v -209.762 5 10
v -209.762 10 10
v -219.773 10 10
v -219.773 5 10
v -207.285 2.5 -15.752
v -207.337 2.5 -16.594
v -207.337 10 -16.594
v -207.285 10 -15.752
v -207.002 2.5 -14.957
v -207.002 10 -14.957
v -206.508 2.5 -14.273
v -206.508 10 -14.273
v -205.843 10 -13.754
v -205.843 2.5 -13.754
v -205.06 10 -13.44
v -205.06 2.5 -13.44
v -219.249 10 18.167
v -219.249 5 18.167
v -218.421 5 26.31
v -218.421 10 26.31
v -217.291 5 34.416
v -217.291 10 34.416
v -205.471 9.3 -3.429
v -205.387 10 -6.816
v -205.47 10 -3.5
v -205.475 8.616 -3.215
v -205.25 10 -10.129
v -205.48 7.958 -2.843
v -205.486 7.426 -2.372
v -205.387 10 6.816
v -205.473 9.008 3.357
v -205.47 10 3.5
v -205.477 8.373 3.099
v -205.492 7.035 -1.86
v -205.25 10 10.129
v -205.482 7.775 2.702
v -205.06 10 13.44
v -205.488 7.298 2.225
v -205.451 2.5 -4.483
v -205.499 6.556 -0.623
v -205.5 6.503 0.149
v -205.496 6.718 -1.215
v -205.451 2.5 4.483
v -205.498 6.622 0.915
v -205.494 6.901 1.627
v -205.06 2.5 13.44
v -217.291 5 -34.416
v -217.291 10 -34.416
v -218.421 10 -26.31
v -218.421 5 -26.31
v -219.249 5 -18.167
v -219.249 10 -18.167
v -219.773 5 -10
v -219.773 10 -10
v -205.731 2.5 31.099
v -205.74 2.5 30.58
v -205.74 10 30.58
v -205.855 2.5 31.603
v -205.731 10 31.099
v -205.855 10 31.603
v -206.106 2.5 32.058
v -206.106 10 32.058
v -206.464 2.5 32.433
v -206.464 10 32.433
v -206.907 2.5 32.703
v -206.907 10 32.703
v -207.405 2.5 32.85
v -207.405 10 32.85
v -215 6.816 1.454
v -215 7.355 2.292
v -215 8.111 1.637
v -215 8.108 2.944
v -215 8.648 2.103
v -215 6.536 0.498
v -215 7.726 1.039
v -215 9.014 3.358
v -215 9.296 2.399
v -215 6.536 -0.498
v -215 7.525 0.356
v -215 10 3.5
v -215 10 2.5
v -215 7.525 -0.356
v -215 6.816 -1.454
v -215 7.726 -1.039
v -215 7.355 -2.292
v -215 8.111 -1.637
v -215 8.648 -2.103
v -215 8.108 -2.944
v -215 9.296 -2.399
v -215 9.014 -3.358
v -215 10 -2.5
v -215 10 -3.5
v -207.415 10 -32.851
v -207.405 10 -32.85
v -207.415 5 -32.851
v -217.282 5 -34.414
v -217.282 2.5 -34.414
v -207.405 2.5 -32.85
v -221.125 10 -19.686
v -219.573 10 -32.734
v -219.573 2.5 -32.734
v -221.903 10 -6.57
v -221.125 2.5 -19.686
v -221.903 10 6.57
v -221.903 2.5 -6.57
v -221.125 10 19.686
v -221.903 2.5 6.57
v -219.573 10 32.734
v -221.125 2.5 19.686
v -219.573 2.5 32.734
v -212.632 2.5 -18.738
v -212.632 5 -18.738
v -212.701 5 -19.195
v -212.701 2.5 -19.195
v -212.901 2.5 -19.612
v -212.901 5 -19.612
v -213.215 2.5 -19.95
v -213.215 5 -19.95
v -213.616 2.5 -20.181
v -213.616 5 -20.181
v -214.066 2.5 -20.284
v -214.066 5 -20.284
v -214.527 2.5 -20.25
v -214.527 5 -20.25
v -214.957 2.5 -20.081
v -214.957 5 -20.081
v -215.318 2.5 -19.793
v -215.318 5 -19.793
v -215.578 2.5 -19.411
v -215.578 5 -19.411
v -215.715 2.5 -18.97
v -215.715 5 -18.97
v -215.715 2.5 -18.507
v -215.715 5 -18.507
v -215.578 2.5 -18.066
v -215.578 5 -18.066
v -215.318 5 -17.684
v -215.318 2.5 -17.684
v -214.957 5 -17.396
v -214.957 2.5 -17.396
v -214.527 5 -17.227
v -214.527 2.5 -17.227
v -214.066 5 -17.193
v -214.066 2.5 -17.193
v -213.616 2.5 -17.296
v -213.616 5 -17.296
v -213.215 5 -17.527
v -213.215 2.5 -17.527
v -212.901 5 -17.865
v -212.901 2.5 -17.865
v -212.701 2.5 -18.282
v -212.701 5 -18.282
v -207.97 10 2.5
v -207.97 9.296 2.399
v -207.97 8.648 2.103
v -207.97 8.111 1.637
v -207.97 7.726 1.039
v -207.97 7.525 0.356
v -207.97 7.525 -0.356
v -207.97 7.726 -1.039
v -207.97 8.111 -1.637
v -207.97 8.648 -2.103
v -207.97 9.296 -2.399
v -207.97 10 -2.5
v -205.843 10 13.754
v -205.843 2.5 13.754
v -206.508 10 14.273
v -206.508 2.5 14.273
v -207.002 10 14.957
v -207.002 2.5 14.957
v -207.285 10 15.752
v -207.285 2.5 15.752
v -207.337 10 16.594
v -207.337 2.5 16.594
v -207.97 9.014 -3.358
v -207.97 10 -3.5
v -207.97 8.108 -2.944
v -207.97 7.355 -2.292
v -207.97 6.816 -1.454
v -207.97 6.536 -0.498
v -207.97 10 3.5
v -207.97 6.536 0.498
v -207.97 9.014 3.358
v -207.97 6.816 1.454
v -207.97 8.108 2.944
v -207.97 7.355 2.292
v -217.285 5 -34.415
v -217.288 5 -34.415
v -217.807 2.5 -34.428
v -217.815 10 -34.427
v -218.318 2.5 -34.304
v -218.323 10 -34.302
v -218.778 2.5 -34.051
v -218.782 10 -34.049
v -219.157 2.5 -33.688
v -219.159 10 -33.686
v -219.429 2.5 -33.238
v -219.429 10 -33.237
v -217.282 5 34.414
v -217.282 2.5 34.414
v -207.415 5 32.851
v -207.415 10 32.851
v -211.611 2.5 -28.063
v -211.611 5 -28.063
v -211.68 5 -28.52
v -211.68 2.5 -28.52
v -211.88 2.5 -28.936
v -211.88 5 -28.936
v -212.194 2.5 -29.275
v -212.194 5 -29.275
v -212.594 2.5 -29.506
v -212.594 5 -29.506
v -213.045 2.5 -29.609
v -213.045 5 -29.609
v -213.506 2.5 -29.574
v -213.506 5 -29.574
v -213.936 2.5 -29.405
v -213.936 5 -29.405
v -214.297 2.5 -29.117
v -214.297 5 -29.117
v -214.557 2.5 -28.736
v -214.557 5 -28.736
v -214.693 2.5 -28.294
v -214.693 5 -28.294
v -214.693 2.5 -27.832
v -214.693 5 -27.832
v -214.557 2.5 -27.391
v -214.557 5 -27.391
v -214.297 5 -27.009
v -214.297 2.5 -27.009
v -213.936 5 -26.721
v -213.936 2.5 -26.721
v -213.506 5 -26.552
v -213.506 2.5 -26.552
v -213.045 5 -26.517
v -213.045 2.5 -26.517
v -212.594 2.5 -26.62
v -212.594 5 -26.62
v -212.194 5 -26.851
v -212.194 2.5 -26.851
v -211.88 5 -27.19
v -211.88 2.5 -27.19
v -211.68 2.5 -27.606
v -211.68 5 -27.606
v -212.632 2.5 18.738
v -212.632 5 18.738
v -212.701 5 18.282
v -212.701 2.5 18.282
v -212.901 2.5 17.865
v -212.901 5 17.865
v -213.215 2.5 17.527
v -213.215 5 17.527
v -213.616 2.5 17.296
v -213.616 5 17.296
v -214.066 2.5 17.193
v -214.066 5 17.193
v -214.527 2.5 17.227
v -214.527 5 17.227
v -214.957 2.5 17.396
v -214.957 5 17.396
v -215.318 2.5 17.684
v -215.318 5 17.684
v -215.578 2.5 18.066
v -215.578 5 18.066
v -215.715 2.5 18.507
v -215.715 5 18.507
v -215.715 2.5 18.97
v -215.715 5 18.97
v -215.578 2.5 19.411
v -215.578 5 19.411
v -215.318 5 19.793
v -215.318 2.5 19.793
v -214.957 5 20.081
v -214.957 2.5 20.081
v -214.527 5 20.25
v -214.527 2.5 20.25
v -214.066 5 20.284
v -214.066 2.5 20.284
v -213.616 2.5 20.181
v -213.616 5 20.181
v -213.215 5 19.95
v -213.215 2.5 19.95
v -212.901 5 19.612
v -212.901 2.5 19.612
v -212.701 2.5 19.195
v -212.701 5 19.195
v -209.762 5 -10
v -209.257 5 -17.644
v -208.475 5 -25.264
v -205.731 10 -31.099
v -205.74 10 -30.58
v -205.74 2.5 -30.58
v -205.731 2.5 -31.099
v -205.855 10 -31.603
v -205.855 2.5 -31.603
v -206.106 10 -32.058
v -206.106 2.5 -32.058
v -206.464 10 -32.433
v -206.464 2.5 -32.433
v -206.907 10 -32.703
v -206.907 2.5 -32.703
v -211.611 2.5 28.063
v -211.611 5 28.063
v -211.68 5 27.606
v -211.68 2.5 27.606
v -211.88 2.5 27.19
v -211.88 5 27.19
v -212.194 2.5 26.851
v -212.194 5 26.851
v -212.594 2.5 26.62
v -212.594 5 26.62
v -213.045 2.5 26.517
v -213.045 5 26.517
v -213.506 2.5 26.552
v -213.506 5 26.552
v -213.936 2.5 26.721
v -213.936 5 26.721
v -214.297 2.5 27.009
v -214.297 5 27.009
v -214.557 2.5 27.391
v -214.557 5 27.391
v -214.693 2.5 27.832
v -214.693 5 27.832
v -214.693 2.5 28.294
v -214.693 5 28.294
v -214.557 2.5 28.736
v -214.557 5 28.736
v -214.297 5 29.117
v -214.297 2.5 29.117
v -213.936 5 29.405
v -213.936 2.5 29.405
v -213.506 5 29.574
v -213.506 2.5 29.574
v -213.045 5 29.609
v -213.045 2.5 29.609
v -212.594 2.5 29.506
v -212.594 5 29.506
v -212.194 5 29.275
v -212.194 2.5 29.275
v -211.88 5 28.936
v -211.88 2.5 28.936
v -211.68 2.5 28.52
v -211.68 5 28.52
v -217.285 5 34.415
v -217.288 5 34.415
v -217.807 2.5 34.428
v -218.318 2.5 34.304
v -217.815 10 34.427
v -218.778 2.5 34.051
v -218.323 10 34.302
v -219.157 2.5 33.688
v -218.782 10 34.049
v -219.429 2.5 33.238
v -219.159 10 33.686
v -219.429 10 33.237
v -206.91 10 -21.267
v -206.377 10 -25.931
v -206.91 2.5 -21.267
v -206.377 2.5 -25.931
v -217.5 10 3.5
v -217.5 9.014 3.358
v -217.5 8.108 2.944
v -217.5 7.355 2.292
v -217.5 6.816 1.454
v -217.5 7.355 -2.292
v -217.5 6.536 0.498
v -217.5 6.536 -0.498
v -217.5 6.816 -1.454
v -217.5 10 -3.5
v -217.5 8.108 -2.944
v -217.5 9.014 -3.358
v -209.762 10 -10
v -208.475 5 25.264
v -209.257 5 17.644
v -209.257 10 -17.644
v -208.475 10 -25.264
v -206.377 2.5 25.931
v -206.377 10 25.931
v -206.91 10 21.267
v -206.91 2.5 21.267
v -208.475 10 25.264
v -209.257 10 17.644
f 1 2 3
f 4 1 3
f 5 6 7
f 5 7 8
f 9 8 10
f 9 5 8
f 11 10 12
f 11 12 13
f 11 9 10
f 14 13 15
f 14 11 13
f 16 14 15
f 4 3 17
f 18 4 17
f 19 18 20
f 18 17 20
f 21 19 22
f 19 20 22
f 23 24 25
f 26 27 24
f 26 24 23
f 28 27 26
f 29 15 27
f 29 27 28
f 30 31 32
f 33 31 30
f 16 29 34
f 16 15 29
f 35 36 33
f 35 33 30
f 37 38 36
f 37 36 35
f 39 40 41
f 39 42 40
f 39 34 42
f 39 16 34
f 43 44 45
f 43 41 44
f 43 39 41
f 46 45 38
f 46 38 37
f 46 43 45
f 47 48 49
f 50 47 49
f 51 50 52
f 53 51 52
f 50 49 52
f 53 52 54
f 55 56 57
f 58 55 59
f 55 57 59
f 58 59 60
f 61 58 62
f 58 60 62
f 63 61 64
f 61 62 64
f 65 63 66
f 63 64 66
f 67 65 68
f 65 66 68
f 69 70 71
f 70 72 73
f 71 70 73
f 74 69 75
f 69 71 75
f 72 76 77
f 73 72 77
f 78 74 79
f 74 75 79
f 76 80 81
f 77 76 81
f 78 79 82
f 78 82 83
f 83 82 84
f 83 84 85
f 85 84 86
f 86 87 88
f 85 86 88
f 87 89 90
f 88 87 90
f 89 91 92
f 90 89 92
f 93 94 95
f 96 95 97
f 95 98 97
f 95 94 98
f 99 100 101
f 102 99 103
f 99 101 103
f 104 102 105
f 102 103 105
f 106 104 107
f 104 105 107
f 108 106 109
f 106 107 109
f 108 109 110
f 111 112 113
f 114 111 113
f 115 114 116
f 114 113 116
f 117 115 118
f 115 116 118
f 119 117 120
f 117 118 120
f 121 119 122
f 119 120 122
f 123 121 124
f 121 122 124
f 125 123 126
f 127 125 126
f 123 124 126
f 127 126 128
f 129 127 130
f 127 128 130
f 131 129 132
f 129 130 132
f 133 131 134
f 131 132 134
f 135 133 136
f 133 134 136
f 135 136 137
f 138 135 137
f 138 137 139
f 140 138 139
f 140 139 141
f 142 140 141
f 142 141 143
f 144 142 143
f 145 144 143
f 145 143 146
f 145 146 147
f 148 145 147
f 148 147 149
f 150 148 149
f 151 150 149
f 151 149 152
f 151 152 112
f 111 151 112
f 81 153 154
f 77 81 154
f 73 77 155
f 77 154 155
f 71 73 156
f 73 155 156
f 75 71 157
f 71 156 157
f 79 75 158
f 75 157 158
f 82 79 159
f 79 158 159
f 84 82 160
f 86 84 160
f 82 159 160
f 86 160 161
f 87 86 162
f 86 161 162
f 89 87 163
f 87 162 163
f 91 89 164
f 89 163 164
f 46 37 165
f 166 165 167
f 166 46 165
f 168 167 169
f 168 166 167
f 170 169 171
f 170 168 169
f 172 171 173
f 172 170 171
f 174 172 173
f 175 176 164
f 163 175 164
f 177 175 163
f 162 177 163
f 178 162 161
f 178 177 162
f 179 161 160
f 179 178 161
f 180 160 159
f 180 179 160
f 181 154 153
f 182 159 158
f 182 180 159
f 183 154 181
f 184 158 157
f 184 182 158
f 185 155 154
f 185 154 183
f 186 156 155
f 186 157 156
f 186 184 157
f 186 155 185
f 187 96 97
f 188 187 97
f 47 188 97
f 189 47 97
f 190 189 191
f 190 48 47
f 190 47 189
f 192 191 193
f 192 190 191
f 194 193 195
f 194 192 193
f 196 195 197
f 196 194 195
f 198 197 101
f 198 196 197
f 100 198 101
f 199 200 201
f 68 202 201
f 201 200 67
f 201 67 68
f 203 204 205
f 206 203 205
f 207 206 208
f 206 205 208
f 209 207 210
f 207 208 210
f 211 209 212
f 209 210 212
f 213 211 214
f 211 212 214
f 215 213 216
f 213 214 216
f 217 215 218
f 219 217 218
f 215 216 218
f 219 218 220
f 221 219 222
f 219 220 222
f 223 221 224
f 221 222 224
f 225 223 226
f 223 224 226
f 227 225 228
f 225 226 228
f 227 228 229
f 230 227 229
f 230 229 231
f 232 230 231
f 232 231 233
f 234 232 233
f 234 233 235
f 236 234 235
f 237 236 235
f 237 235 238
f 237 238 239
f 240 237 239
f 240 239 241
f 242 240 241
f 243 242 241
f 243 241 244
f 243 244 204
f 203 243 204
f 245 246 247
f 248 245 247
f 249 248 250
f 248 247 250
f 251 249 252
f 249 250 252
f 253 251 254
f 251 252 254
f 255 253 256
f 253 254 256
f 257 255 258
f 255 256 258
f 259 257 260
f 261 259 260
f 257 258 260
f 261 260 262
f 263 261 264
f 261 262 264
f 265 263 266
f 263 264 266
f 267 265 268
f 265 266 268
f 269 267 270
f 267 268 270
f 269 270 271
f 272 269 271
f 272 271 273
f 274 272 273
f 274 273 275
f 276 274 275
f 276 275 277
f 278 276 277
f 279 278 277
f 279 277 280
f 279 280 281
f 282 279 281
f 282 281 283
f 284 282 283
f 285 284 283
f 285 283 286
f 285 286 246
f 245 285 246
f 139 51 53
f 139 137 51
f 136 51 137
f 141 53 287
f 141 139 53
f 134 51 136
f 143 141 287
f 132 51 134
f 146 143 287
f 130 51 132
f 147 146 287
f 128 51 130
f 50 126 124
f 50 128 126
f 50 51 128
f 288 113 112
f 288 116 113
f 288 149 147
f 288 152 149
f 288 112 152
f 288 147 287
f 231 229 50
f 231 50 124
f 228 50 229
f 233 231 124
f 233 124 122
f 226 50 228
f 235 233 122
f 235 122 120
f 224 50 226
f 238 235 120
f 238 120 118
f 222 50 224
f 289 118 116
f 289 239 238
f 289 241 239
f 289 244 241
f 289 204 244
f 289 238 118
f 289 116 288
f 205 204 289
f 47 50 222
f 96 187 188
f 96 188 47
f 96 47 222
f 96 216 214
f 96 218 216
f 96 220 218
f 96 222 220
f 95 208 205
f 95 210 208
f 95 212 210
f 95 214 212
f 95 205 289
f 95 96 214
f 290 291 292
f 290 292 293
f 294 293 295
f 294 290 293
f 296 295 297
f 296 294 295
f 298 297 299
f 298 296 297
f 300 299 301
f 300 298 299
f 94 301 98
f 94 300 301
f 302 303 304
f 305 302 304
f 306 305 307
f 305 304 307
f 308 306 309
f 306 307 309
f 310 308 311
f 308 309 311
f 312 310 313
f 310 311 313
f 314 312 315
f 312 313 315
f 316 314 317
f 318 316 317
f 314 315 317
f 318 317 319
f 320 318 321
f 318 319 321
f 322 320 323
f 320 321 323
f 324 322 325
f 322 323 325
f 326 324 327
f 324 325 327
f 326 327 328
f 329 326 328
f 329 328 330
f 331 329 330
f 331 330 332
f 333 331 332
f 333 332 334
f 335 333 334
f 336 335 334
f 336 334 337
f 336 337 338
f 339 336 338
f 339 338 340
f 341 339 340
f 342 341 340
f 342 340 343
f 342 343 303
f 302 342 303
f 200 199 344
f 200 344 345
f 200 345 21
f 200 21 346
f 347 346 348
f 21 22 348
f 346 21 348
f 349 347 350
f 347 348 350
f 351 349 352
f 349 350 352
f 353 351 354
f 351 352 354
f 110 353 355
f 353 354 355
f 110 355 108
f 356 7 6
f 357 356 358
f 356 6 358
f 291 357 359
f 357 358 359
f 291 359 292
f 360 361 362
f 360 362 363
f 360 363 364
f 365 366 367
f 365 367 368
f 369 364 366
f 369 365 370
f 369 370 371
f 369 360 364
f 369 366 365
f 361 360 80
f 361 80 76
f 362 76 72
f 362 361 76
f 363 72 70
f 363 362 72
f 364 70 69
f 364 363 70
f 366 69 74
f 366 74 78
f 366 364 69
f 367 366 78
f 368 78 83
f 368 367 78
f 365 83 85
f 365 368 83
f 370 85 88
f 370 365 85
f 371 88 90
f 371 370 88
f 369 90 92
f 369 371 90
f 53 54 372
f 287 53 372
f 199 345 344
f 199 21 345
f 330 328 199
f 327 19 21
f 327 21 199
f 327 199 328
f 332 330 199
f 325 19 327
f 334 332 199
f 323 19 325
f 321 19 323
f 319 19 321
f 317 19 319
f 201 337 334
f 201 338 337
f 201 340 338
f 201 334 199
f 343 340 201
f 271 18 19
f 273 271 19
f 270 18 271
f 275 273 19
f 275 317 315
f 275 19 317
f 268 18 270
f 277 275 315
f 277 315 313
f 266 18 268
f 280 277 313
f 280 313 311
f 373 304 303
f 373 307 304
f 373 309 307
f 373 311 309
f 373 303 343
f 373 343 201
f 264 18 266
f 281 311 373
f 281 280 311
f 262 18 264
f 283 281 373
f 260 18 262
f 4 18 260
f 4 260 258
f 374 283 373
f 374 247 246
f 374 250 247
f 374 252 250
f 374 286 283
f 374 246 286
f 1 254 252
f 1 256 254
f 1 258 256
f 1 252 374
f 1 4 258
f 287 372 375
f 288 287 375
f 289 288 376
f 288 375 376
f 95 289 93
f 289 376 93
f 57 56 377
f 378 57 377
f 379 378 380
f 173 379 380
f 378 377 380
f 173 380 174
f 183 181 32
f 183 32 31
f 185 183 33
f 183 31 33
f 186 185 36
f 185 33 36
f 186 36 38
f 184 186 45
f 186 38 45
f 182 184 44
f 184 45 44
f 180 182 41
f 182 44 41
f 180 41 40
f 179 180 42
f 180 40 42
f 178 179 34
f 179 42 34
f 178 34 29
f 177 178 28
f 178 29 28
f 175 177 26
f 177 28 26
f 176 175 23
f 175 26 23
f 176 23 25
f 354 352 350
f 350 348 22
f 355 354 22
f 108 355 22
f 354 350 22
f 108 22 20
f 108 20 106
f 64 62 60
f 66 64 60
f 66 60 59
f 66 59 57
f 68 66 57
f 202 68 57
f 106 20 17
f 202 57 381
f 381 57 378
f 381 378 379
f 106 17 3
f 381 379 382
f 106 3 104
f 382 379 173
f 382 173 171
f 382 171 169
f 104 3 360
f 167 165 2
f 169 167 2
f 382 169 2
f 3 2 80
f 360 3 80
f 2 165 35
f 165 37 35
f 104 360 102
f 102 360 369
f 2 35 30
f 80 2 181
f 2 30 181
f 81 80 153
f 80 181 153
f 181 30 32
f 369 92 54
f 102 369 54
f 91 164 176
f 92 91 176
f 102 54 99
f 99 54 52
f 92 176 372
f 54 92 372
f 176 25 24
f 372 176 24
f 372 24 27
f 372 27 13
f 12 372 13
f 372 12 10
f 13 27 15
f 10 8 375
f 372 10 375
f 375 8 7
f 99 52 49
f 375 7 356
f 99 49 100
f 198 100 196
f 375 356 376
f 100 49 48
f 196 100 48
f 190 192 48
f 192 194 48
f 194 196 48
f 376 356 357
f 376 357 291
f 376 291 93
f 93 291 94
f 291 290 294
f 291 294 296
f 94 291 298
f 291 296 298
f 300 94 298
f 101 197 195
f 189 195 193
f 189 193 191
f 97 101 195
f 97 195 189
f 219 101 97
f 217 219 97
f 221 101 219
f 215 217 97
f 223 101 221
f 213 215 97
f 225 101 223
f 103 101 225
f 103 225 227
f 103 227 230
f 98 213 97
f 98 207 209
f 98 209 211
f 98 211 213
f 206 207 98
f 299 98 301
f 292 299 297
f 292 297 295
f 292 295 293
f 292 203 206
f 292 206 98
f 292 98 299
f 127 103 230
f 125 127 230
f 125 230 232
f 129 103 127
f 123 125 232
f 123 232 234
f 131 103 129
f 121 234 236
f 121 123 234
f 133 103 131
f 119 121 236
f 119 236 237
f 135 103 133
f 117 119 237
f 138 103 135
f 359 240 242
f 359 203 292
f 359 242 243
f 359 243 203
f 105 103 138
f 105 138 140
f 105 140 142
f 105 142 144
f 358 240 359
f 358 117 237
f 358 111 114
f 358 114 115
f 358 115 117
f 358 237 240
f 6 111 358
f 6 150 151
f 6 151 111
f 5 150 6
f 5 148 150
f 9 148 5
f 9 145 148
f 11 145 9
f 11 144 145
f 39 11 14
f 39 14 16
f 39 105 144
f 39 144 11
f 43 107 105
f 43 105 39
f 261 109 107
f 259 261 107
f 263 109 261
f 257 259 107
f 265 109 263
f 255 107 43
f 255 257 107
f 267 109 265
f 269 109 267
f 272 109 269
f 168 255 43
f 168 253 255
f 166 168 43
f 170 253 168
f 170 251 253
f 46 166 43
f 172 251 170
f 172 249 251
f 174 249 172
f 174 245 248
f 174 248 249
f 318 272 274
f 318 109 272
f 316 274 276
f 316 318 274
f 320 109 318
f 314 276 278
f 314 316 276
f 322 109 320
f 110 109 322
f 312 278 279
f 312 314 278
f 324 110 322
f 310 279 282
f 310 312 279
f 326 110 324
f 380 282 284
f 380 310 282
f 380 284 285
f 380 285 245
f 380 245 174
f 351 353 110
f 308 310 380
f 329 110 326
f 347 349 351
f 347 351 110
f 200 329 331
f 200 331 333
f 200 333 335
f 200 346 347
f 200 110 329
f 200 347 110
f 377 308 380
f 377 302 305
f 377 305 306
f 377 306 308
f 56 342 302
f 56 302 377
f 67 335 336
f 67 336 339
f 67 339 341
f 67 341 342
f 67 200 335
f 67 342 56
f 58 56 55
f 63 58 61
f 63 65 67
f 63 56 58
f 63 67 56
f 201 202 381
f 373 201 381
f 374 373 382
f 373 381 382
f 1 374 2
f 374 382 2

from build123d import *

# Parameters (mm, degrees)
BOSS_EXTRUDE1_DEPTH        = 10
CUT_EXTRUDE1_DEPTH         = 5
F_3_1_3_1_DIAMETER_HOLE2_D = 3.1
BOSS_EXTRUDE2_DEPTH        = 10
FILLET1_R                  = 3
FILLET2_R                  = 2
CUT_EXTRUDE6_DEPTH         = 2.5
SKETCH28_R                 = 3.5000000000000004
CUT_EXTRUDE7_DEPTH         = 2.5
SKETCH29_W                 = 2.5
SKETCH29_H                 = 3.5000000000000004
SKETCH30_R                 = 2.5000000000000004
CUT_EXTRUDE8_DEPTH         = 7.029807515


with BuildPart() as part:
    # Sketch1 → Boss-Extrude1 (new body)
    with BuildSketch(Plane(origin=(0, 0, 0), x_dir=(1, 0, 0), z_dir=(0, 1, 0))):
        with BuildLine():
            ThreePointArc((-207.41455152497886, 32.851237658448525), (-209.99999999999994, 2.572e-14), (-207.41455152497886, -32.85123765844857))
            Line((-207.41455152497886, -32.85123765844857), (-217.29143493093028, -34.41558230885091))
            ThreePointArc((-217.29143493093028, -34.41558230885091), (-220, 2.694e-14), (-217.29143493093028, 34.415582308850865))
            Line((-217.29143493093028, 34.415582308850865), (-207.41455152497886, 32.851237658448525))
        make_face()
        with BuildLine():
            ThreePointArc((-217.2914349309303, -34.415582308850915), (-219.99999999999997, -1.421e-14), (-217.2914349309303, 34.415582308850865))
            Line((-217.29143493093028, 34.41558230885082), (-219.26681161212053, 34.72845123893128))
            ThreePointArc((-219.26681161212053, 34.72845123893128), (-221.99999999999997, -2.665e-14), (-219.26681161212053, -34.72845123893134))
            Line((-219.26681161212053, -34.728451238931335), (-217.29143493093028, -34.41558230885088))
        make_face()
        with BuildLine():
            Line((-205.4391748437886, 32.538368728368056), (-207.41455152497886, 32.85123765844851))
            ThreePointArc((-207.41455152497886, 32.851237658448525), (-209.99999999999994, -2.132e-14), (-207.41455152497886, -32.85123765844859))
            Line((-207.41455152497886, -32.85123765844857), (-205.4391748437886, -32.53836872836811))
            ThreePointArc((-205.43917484378863, -32.53836872836813), (-207.99999999999997, -2.842e-14), (-205.43917484378863, 32.538368728368056))
        make_face()
    extrude(amount=BOSS_EXTRUDE1_DEPTH)

    # Sketch15 → Cut-Extrude1 (cut)
    with BuildSketch(Plane(origin=(0, 10, 0), x_dir=(1, 0, 0), z_dir=(0, 1, 0))):
        with BuildLine():
            Line((-219.7726097583591, 9.999999999999972), (-209.76176963403066, 9.999999999999972))
            ThreePointArc((-209.76176963403046, 9.999999999995824), (-208.90085088283388, 21.457737542154447), (-207.41455152497886, 32.851237658448504))
            Line((-207.41455152497886, 32.851237658448504), (-217.29143493093028, 34.41558230885091))
            ThreePointArc((-217.2914349309303, 34.41558230885091), (-218.8727368927212, 22.242415450882426), (-219.7726097583591, 10.000000000000421))
        make_face()
        with BuildLine():
            ThreePointArc((-207.4145515249789, -32.85123765844855), (-208.90085088283385, -21.457737542154504), (-209.76176963403046, -9.999999999995891))
            Line((-209.76176963403066, -10.000000000000028), (-219.77260975835907, -10.00000000000003))
            ThreePointArc((-219.7726097583591, -10.000000000000506), (-218.8727368927212, -22.242415450882447), (-217.2914349309303, -34.41558230885088))
            Line((-217.29143493093028, -34.41558230885086), (-207.41455152497886, -32.85123765844855))
        make_face()
    extrude(amount=-CUT_EXTRUDE1_DEPTH, mode=Mode.SUBTRACT)

    # Ø3.1 (3.1) Diameter Hole2 (through all)
    with Locations(Plane(origin=(0, 0, 0), x_dir=(-1, 0, 0), z_dir=(0, -1, 0))):
        with Locations((213.160645195, -28.063131327), (214.18186009, -18.738484691), (214.18186009, 18.738484691), (213.160645195, 28.063131327)):
            Hole(F_3_1_3_1_DIAMETER_HOLE2_D / 2)

    # Sketch19 → Boss-Extrude2 (add)
    with BuildSketch(Plane(origin=(0, 0, 0), x_dir=(1, 0, 0), z_dir=(0, 1, 0))):
        with BuildLine():
            Line((-205.06000872553298, -13.44034305679455), (-207.55465603362947, -13.603850879869908))
            ThreePointArc((-207.55465603362947, -13.603850879869908), (-207.99999999999994, 2.547e-14), (-207.55465603362947, 13.603850879869857))
            Line((-207.55465603362947, 13.603850879869857), (-205.06000872553298, 13.440343056794502))
            ThreePointArc((-205.06000872553298, 13.440343056794502), (-205.49999999999997, 2.517e-14), (-205.06000872553298, -13.44034305679455))
        make_face()
    extrude(amount=BOSS_EXTRUDE2_DEPTH)

    # Fillet1
    # the kernel refuses this fillet: 3 mm, written as the material it adds along each edge
    with BuildSketch(Plane(origin=(-207.5546560336295, 0, -13.60385087986986), x_dir=(0.07259195171826252, 0, -0.9973617240228008), z_dir=(0, 1, 0))) as fillet1_piece_1:
        with BuildLine():
            CenterArc((2.97605695844059, -2.9999221104362666), FILLET1_R, 89.58712595875737, 80.81905726138756)
            Line((0.01801487263020066, -2.4999350920302814), (-0.04114596908600657, -2.489935351662162))
            ThreePointArc((-0.04114596908600657, -2.489935351662162), (-0.05099100589383556, -1.2503999029582549), (-0.05999844220872477, -0.00043235694312724))
            Line((-0.05999844220872477, -0.00043235694312724), (-0.00043235694311419, 0.05999844220871681))
            ThreePointArc((-0.00043235694311419, 0.05999844220871681), (1.4988374027981592, 0.06540034308590705), (2.998107162539448, 0.05999844220873665))
            Line((2.998107162539448, 0.05999844220873665), (2.9976748055963345, 1e-17))
        make_face()
    extrude(amount=10)
    with BuildSketch(Plane(origin=(-207.5546560336295, 0, 13.60385087986991), x_dir=(0.07259195171826295, 0, 0.9973617240228008), z_dir=(0, 1, 0))) as fillet1_piece_2:
        with BuildLine():
            CenterArc((2.9760569584405734, 2.9999221104362666), FILLET1_R, 189.5938167798556, 80.819057261387)
            Line((0.01801487263018374, 2.4999350920302543), (-0.04114596908602352, 2.4899353516621354))
            ThreePointArc((-0.04114596908602352, 2.4899353516621354), (-0.05099100589383325, 1.2503999029582546), (-0.05999844220872477, 0.00043235694312726))
            Line((-0.05999844220872477, 0.00043235694312726), (-0.00043235694311422, -0.05999844220871681))
            ThreePointArc((-0.00043235694311422, -0.05999844220871681), (1.498837402798161, -0.06540034308590782), (2.9981071625394304, -0.05999844220873665))
            Line((2.9981071625394304, -0.05999844220873665), (2.9976748055963167, 0))
        make_face()
    extrude(amount=10)

    # Fillet2
    fillet2_edges = [part.edges().sort_by_distance(p)[0] for p in [
        (-219.26681161212053, 5, 34.72845123893134),
        (-219.26681161212053, 5, -34.728451238931285),
        (-205.43917484378863, 5, -32.538368728368056),
        (-205.43917484378863, 5, 32.53836872836813),
    ]]
    fillet(fillet2_edges, radius=FILLET2_R)

    # Sketch26 → Cut-Extrude6 (cut)
    with BuildSketch(Plane.XZ):
        with BuildLine():
            Line((-217.28245576049179, -34.41416014796698), (-207.40514475604385, -32.849747772616084))
            ThreePointArc((-207.40514475604385, -32.849747772616084), (-206.1055960612061, -32.057633278286005), (-205.73974688911358, -30.580329461983652))
            ThreePointArc((-205.73974688911358, -30.580329461983652), (-206.65676096006328, -23.600490450312087), (-207.33704896887454, -16.593616992039934))
            ThreePointArc((-207.33704896887454, -16.593616992039934), (-206.7787671555463, -14.597978692482226), (-205.06000872553278, -13.440343056794774))
            ThreePointArc((-205.06000872553278, -13.440343056794774), (-205.5, -6.609e-14), (-205.060008725533, 13.440343056794593))
            ThreePointArc((-205.060008725533, 13.440343056794593), (-206.77876715554575, 14.597978692481712), (-207.3370489688746, 16.593616992038744))
            ThreePointArc((-207.3370489688746, 16.593616992038744), (-206.6567609600633, 23.60049045031153), (-205.73974688911358, 30.580329461983624))
            ThreePointArc((-205.73974688911358, 30.580329461983624), (-206.10559606120609, 32.057633278286005), (-207.40514475604385, 32.84974777261609))
            Line((-207.40514475604385, 32.84974777261609), (-217.28245576049179, 34.41416014796698))
            ThreePointArc((-217.28245576049179, 34.41416014796698), (-218.7782378264501, 34.05145718237069), (-219.57346400594108, 32.7336814982928))
            ThreePointArc((-219.57346400594108, 32.7336814982928), (-221.99999999999994, 1.2577e-13), (-219.5734640059411, -32.733681498292746))
            ThreePointArc((-219.5734640059411, -32.733681498292746), (-218.7782378264501, -34.051457182370655), (-217.28245576049179, -34.41416014796698))
        make_face()
    extrude(amount=-CUT_EXTRUDE6_DEPTH, mode=Mode.SUBTRACT)

    # Sketch28 → Cut-Extrude7 (cut)
    with BuildSketch(Plane(origin=(-217.5, 0, 0), x_dir=(0, 0, -1), z_dir=(1, 0, 0))):
        with Locations((-2.082e-14, 10)):
            Circle(SKETCH28_R)
    extrude(amount=CUT_EXTRUDE7_DEPTH, mode=Mode.SUBTRACT)

    # Sketch29 → Cut-Revolve1 (revolve, cut)
    with BuildSketch(Plane(origin=(0, 10, 0), x_dir=(1, 0, 0), z_dir=(0, 1, 0))):
        with Locations((-206.72019248543083, -1.7500000000000002)):
            Rectangle(SKETCH29_W, SKETCH29_H)
    revolve(axis=Axis((-217.5, 10, 1.53e-15), (1, 0, -1.2e-16)), mode=Mode.SUBTRACT)

    # Sketch30 → Cut-Extrude8 (cut)
    with BuildSketch(Plane(origin=(-207.97019248543083, 0, 2.547e-14), x_dir=(-1.2e-16, 0, -1), z_dir=(1, 0, -1.2e-16))):
        with Locations((2.515e-14, 10)):
            Circle(SKETCH30_R)
    extrude(amount=-CUT_EXTRUDE8_DEPTH, mode=Mode.SUBTRACT)


solid = part.part
